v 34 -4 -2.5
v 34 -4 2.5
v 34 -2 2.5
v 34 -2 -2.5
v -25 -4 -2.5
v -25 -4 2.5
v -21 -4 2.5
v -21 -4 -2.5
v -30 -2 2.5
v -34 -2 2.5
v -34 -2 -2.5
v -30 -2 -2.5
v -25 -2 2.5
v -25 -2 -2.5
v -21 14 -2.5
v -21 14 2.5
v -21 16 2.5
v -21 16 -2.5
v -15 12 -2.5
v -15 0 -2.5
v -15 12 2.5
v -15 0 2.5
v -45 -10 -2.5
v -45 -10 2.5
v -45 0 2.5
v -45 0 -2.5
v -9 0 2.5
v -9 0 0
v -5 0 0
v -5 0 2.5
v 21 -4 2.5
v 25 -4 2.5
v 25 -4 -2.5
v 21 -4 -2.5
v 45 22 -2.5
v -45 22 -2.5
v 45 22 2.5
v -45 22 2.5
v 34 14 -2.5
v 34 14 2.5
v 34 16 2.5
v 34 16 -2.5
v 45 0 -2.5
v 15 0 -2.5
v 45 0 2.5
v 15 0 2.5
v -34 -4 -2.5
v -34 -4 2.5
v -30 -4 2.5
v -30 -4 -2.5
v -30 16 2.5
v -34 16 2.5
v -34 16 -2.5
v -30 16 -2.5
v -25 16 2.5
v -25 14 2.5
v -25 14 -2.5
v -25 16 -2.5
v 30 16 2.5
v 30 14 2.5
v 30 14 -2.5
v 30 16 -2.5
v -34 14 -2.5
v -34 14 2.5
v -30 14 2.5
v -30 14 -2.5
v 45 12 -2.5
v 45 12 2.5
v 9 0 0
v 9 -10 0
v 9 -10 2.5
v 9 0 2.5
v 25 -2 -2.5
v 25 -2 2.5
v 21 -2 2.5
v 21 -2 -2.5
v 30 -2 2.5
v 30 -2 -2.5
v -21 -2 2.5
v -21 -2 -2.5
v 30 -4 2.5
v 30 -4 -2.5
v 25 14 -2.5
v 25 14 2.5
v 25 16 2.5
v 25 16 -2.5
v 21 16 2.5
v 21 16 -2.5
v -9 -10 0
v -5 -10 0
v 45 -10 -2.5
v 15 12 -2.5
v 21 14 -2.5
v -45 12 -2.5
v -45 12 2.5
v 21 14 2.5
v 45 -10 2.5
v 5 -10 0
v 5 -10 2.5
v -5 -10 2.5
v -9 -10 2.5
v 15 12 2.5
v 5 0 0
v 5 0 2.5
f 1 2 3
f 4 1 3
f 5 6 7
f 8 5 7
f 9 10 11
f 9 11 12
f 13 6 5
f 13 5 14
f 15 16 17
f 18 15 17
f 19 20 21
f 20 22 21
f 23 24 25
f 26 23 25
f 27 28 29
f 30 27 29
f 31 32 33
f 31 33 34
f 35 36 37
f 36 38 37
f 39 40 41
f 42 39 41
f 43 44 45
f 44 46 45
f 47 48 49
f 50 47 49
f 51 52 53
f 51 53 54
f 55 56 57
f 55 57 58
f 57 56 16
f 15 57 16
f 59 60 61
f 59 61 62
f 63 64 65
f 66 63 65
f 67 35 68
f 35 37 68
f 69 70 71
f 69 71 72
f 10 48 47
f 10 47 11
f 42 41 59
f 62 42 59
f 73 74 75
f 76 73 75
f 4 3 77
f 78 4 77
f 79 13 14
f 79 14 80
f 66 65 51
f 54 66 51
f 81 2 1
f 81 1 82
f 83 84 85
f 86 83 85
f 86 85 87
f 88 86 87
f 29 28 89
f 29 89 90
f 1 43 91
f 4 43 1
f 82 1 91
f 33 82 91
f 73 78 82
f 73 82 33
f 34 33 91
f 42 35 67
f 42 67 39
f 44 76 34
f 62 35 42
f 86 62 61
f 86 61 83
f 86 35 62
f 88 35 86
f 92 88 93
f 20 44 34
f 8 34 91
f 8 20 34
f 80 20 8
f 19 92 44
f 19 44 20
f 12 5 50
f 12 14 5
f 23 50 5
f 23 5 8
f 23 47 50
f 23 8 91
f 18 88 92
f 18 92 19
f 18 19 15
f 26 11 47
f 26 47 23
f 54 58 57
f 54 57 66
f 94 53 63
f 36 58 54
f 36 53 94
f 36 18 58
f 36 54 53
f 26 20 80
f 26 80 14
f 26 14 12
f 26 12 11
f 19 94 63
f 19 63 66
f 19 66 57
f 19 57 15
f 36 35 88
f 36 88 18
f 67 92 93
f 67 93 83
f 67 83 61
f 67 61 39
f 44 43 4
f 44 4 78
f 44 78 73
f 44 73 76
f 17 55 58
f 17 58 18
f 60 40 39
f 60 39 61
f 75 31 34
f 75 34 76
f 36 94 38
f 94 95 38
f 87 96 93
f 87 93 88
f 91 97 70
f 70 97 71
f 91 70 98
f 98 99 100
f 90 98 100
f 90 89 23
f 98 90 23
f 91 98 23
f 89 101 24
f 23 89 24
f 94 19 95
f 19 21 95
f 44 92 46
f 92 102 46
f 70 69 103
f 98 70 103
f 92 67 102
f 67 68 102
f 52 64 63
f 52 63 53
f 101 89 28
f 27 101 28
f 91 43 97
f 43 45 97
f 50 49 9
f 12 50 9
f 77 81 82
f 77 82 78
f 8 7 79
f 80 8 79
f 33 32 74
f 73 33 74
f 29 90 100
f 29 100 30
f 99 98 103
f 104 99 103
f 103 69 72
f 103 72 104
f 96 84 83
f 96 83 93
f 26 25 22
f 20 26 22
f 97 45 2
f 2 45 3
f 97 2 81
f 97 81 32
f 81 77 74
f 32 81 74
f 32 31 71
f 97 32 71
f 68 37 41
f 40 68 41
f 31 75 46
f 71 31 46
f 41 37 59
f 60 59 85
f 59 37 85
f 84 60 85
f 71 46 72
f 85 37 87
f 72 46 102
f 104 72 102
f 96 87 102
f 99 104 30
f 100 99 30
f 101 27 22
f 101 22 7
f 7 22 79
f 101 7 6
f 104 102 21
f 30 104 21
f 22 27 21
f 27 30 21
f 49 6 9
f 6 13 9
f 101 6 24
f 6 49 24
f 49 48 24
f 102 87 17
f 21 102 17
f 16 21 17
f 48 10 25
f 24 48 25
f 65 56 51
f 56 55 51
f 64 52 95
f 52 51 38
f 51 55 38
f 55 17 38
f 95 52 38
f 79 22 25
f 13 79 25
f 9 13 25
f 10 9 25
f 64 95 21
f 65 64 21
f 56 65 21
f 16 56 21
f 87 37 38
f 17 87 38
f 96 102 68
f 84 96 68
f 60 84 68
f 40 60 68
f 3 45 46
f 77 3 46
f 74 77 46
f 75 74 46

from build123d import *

# Parameters (mm, degrees)
PAD_DEPTH         = 2.5
SKETCH001_W       = 4
SKETCH001_H       = 2
POCKET_DEPTH      = 193.80181
POCKET_DEPTH_BACK = 193.80181
SKETCH002_W       = 4
SKETCH002_H       = 12
POCKET001_DEPTH   = 193.80181


with BuildPart() as part:
    # Sketch → Pad (new body, symmetric)
    with BuildSketch(Plane.XY):
        Polygon((-45, 0), (-15, 0), (-15, 12), (-45, 12), (-45, 22), (45, 22), (45, 12), (15, 12), (15, 0), (45, 0), (45, -10), (-45, -10), align=None)
    extrude(amount=PAD_DEPTH, both=True)

    # Sketch001 → Pocket (cut, two sides)
    with BuildSketch(Plane.XY) as pocket_sk:
        with Locations((-32, -3)):
            Rectangle(SKETCH001_W, SKETCH001_H)
        with Locations((-32, 15)):
            Rectangle(SKETCH001_W, SKETCH001_H)
        with Locations((-23, -3)):
            Rectangle(SKETCH001_W, SKETCH001_H)
        with Locations((-23, 15)):
            Rectangle(SKETCH001_W, SKETCH001_H)
    pocket = extrude(amount=-POCKET_DEPTH, mode=Mode.SUBTRACT) + extrude(pocket_sk.sketch, amount=POCKET_DEPTH_BACK, mode=Mode.SUBTRACT)

    # Mirrored: Pocket across YZ
    add(pocket.mirror(Plane.YZ), mode=Mode.SUBTRACT)

    # Sketch002 → Pocket001 (cut, through all)
    with BuildSketch(Plane.XY):
        with Locations((-7, -6)):
            Rectangle(SKETCH002_W, SKETCH002_H)
    pocket001 = extrude(amount=POCKET001_DEPTH, mode=Mode.SUBTRACT)

    # Mirrored001: Pocket001 across Sketch002 V_Axis
    add(pocket001.mirror(Plane(origin=(0, 0, 0), x_dir=(0, 0, 1), z_dir=(1, 0, 0))), mode=Mode.SUBTRACT)


solid = part.part
